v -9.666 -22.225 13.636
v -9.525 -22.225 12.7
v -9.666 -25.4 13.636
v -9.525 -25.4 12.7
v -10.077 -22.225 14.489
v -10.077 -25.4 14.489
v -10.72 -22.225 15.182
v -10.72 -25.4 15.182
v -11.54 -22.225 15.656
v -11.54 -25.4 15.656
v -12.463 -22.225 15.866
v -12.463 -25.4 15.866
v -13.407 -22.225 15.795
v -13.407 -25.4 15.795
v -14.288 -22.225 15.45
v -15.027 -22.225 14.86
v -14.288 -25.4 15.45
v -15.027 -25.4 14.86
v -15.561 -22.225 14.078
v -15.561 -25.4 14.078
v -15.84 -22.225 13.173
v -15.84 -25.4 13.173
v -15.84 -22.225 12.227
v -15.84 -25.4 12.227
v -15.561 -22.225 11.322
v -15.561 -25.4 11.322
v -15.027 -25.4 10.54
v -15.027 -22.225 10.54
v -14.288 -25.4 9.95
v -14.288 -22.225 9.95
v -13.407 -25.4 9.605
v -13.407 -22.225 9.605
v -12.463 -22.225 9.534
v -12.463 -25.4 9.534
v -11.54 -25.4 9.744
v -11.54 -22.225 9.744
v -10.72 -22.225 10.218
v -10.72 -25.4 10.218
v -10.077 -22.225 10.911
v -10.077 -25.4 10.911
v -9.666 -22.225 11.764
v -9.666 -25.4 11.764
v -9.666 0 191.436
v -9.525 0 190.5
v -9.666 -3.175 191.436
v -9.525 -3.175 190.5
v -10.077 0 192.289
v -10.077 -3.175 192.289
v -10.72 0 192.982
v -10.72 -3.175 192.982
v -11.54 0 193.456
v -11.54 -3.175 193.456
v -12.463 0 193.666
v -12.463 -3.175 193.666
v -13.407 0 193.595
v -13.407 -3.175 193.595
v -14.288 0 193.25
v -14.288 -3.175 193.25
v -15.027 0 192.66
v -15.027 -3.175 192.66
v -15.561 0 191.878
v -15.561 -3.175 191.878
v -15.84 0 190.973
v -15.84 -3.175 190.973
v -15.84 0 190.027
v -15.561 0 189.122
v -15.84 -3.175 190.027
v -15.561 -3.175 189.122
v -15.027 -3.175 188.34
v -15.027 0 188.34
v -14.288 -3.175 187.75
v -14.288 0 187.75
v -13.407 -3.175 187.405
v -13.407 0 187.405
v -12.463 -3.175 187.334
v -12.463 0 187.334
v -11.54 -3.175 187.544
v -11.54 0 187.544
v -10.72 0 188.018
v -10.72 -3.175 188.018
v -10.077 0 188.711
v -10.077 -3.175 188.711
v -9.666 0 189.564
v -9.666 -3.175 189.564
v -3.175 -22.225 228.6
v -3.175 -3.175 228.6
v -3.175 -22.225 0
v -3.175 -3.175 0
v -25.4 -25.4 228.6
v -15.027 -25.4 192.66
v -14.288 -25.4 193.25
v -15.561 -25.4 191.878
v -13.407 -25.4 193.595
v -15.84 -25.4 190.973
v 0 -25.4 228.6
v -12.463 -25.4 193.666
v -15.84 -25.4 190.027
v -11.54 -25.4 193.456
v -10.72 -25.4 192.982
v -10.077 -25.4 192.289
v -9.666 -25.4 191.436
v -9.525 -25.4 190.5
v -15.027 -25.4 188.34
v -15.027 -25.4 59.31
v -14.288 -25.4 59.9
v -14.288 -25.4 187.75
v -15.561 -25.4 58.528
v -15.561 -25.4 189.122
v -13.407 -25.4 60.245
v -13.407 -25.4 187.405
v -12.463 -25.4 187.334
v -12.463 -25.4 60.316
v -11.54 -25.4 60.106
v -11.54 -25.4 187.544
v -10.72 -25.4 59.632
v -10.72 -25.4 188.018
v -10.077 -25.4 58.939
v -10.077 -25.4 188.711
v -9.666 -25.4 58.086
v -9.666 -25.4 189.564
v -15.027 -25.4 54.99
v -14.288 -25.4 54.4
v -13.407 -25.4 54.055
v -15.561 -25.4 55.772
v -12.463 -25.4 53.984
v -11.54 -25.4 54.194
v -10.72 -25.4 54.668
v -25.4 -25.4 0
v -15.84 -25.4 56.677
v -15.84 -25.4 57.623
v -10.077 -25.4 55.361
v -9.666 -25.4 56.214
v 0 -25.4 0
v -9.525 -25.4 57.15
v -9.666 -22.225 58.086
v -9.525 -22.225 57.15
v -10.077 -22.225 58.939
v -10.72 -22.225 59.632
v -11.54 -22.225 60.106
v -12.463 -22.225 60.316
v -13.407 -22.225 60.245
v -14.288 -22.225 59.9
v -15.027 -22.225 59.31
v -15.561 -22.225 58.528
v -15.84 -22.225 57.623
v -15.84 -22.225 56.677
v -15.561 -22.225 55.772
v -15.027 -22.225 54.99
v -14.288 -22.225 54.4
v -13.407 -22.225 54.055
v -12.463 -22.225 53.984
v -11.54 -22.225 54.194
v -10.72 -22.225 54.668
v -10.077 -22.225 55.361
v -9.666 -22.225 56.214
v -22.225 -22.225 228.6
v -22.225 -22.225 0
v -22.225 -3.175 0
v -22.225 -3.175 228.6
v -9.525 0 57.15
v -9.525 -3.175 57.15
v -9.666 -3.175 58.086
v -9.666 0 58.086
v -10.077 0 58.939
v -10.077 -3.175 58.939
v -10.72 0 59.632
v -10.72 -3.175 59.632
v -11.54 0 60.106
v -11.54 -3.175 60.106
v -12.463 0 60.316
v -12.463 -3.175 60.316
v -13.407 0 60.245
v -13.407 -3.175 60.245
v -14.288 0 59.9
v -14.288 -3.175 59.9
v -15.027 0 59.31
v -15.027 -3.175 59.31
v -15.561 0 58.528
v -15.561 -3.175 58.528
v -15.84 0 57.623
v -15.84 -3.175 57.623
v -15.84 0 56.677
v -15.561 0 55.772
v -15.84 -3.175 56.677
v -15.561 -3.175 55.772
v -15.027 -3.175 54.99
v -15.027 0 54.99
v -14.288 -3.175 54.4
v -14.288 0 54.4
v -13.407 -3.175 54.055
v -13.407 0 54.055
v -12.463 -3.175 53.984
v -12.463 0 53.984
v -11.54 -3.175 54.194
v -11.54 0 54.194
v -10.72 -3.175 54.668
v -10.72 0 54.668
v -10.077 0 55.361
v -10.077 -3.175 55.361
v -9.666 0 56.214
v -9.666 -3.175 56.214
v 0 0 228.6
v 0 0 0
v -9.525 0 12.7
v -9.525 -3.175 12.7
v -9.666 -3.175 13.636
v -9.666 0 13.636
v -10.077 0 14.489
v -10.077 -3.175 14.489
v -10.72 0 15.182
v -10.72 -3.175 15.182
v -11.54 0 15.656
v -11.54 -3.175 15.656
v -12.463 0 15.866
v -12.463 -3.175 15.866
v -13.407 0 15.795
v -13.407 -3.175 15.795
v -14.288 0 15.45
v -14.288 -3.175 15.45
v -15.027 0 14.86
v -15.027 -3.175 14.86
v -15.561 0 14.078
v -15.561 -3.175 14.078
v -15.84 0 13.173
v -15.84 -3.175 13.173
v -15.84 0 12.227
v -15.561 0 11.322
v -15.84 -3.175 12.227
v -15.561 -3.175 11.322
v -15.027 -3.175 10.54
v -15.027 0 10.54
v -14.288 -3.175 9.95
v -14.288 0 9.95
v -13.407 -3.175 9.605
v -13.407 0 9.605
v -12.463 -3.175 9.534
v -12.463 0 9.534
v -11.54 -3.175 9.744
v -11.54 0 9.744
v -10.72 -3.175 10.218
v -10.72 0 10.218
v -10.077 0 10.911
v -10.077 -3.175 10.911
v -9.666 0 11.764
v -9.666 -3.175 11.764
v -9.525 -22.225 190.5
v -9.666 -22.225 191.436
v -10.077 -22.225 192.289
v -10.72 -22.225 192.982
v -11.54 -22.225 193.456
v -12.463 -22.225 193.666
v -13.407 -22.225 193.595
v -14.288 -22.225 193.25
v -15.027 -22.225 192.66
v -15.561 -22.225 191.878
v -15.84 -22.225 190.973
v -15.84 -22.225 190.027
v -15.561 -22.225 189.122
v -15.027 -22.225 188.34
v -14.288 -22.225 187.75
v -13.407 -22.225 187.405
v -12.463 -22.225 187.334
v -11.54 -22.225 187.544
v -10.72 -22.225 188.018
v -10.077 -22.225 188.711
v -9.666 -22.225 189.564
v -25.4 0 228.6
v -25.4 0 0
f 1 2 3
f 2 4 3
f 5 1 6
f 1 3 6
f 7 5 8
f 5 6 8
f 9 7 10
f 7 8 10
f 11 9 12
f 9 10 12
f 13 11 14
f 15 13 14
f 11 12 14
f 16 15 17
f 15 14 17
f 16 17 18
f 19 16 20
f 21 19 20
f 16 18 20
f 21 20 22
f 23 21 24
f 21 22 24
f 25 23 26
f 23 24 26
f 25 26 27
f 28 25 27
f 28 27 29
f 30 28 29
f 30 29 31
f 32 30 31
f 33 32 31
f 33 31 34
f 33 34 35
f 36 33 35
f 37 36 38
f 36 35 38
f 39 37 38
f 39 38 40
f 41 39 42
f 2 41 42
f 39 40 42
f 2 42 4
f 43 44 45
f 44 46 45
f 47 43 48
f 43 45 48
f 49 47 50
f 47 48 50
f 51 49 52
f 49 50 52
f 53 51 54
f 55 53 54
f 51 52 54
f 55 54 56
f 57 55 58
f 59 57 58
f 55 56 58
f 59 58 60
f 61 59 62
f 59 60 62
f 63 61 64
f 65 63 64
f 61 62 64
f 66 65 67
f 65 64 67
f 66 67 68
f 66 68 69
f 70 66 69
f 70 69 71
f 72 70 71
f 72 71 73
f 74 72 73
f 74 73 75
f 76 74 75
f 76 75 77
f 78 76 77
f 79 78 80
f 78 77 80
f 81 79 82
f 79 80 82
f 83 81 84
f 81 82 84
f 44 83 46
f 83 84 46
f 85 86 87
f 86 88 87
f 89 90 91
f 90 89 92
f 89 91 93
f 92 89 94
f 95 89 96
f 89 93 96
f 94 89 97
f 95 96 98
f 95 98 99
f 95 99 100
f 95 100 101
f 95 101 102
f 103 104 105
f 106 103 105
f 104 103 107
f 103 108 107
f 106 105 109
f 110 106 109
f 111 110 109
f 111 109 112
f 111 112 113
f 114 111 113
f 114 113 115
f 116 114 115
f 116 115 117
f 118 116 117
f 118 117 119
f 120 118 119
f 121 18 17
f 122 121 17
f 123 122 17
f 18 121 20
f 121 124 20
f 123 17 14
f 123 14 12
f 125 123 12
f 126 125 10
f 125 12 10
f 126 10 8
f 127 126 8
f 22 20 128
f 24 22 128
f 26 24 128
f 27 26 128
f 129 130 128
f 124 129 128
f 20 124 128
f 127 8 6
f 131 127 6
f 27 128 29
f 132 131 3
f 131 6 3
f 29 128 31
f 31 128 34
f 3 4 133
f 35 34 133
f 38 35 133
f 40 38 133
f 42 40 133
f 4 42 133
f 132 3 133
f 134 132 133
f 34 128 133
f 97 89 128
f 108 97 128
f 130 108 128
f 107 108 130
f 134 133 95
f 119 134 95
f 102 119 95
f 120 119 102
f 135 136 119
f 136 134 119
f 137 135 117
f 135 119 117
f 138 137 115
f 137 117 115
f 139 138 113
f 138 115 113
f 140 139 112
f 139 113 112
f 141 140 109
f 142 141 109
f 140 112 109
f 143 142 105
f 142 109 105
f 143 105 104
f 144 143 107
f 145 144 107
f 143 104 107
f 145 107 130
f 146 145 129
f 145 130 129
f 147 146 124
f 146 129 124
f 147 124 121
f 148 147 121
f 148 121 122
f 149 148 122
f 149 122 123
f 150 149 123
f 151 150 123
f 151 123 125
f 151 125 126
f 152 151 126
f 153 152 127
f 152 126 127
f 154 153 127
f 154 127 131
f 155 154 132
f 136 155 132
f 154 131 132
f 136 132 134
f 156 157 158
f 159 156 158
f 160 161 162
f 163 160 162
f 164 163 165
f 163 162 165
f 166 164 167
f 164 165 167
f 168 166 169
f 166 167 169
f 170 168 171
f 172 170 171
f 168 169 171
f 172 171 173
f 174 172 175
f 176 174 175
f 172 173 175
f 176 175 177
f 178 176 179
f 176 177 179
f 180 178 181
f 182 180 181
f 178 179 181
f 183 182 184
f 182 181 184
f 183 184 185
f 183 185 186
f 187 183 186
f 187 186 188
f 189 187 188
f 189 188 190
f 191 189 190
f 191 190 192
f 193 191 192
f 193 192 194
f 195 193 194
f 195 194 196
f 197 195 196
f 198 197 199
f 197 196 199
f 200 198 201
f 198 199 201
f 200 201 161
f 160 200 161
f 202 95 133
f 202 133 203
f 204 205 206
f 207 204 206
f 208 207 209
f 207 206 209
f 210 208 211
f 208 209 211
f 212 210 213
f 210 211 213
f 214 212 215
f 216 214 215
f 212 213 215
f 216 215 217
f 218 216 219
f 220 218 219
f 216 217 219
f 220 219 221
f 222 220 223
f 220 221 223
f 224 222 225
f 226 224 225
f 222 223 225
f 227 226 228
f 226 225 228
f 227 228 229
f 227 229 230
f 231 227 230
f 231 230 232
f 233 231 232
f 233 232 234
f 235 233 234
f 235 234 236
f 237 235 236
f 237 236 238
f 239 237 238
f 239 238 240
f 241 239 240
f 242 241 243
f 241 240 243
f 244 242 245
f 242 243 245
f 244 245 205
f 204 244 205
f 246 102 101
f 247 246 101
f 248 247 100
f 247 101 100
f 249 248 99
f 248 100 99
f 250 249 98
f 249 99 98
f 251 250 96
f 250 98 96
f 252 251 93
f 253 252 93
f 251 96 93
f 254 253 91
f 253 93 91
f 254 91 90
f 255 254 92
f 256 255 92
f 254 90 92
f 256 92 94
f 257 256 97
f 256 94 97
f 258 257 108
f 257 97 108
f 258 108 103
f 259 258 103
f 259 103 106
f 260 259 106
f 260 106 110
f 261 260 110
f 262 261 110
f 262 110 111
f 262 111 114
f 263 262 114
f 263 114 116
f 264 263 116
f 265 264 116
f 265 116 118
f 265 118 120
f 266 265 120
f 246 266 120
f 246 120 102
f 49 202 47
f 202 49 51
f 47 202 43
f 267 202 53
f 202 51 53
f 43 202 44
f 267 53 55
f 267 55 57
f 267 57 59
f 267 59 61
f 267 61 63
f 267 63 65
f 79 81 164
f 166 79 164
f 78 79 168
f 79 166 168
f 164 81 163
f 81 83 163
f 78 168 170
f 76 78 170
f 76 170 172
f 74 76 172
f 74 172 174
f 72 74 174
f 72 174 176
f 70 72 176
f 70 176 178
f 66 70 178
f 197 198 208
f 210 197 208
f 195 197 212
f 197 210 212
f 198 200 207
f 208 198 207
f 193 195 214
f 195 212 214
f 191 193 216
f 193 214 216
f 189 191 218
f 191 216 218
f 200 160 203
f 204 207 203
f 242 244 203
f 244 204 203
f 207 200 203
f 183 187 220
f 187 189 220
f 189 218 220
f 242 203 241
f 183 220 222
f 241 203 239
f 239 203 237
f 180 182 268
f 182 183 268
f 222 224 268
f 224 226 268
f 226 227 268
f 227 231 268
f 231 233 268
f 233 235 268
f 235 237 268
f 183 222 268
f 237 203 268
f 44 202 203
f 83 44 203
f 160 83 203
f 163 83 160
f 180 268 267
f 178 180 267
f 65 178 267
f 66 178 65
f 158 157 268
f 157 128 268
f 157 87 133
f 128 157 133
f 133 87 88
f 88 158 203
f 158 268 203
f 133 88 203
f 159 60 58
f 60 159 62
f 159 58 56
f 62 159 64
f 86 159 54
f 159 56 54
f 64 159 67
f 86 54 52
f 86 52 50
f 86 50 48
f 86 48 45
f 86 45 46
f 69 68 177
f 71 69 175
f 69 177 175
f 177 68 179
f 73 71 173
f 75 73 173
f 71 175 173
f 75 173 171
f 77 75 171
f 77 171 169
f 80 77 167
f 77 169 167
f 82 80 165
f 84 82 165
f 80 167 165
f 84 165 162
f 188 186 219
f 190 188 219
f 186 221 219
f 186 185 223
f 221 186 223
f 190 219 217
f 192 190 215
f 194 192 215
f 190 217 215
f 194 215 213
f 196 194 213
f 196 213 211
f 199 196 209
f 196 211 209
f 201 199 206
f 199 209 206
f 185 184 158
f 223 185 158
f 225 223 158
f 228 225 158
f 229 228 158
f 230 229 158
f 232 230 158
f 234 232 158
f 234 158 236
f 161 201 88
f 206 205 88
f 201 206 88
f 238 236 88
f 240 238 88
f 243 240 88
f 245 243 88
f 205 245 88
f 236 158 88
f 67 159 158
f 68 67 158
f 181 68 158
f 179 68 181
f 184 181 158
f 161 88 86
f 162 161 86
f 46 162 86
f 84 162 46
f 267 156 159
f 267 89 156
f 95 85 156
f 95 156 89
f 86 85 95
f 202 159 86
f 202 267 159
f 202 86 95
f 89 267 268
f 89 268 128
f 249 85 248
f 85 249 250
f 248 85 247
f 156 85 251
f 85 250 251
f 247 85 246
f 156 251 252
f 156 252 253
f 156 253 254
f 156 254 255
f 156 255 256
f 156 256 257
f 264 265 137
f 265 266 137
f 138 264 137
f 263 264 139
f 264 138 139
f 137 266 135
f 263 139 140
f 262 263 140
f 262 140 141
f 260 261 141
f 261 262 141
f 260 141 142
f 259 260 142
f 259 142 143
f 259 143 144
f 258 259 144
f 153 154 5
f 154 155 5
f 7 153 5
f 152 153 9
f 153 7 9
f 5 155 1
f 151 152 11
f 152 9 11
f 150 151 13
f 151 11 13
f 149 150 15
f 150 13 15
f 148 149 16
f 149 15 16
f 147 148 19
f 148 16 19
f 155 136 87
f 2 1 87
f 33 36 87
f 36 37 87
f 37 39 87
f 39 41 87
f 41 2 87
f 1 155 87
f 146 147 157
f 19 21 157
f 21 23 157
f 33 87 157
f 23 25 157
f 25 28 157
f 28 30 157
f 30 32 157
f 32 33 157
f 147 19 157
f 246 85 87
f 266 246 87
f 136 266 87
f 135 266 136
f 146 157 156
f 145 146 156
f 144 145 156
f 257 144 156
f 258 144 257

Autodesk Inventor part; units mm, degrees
ref_plane "YZ Plane" through (0, 0, 0) normal (1, 0, 0) x (0, 1, 0)
ref_plane "XZ Plane" through (0, 0, 0) normal (0, 1, 0) x (-1, 0, 0)
ref_plane "XY Plane" through (0, 0, 0) normal (0, 0, 1) x (1, 0, 0)
sketch "Sketch1" plane through (0, 0, 0) normal (0, 0, 1) x (1, 0, 0)
  line L0 (0, 0) -> (-25.4, 0)
  line L1 (-25.4, 0) -> (-25.4, -25.4)
  line L2 (-25.4, -25.4) -> (0, -25.4)
  line L3 (0, -25.4) -> (0, 0)
  line L4 (-3.175, -22.225) -> (-22.225, -22.225)
  line L5 (-22.225, -22.225) -> (-22.225, -3.175)
  line L6 (-22.225, -3.175) -> (-3.175, -3.175)
  line L7 (-3.175, -3.175) -> (-3.175, -22.225)
  dimension "d0" = 25.4
  dimension "d1" = 25.4
  dimension "d2" = 3.175
extrude "Extrusion1" add sketch "Sketch1" along normal blind 228.6
sketch "Sketch2" plane through (-25.4, -25.4, 0) normal (0, -1, 0) x (1, 0, 0)
  circle A0 centre (12.7, 190.5) radius 3.175
  line L0 (0, 228.6) -> (25.4, 228.6) projected
  line L1 (0, 0) -> (0, 228.6) projected
  circle A1 centre (12.7, 12.7) radius 3.175
  circle A2 centre (12.7, 57.15) radius 3.175
  line L2 (0, 0) -> (25.4, 0) projected
  dimension "d5" = 6.35
  dimension "d6" = 38.1
  dimension "d7" = 12.7
  dimension "d10" = 6.35
  dimension "d11" = 12.7
  dimension "d12" = 44.45
  dimension "d13" = 12.7
  dimension "d14" = 12.7
extrude "Extrusion2" cut sketch "Sketch2" against normal blind 152.4
properties part number "15102898-16-A-0205" material "Aluminum 6061"
